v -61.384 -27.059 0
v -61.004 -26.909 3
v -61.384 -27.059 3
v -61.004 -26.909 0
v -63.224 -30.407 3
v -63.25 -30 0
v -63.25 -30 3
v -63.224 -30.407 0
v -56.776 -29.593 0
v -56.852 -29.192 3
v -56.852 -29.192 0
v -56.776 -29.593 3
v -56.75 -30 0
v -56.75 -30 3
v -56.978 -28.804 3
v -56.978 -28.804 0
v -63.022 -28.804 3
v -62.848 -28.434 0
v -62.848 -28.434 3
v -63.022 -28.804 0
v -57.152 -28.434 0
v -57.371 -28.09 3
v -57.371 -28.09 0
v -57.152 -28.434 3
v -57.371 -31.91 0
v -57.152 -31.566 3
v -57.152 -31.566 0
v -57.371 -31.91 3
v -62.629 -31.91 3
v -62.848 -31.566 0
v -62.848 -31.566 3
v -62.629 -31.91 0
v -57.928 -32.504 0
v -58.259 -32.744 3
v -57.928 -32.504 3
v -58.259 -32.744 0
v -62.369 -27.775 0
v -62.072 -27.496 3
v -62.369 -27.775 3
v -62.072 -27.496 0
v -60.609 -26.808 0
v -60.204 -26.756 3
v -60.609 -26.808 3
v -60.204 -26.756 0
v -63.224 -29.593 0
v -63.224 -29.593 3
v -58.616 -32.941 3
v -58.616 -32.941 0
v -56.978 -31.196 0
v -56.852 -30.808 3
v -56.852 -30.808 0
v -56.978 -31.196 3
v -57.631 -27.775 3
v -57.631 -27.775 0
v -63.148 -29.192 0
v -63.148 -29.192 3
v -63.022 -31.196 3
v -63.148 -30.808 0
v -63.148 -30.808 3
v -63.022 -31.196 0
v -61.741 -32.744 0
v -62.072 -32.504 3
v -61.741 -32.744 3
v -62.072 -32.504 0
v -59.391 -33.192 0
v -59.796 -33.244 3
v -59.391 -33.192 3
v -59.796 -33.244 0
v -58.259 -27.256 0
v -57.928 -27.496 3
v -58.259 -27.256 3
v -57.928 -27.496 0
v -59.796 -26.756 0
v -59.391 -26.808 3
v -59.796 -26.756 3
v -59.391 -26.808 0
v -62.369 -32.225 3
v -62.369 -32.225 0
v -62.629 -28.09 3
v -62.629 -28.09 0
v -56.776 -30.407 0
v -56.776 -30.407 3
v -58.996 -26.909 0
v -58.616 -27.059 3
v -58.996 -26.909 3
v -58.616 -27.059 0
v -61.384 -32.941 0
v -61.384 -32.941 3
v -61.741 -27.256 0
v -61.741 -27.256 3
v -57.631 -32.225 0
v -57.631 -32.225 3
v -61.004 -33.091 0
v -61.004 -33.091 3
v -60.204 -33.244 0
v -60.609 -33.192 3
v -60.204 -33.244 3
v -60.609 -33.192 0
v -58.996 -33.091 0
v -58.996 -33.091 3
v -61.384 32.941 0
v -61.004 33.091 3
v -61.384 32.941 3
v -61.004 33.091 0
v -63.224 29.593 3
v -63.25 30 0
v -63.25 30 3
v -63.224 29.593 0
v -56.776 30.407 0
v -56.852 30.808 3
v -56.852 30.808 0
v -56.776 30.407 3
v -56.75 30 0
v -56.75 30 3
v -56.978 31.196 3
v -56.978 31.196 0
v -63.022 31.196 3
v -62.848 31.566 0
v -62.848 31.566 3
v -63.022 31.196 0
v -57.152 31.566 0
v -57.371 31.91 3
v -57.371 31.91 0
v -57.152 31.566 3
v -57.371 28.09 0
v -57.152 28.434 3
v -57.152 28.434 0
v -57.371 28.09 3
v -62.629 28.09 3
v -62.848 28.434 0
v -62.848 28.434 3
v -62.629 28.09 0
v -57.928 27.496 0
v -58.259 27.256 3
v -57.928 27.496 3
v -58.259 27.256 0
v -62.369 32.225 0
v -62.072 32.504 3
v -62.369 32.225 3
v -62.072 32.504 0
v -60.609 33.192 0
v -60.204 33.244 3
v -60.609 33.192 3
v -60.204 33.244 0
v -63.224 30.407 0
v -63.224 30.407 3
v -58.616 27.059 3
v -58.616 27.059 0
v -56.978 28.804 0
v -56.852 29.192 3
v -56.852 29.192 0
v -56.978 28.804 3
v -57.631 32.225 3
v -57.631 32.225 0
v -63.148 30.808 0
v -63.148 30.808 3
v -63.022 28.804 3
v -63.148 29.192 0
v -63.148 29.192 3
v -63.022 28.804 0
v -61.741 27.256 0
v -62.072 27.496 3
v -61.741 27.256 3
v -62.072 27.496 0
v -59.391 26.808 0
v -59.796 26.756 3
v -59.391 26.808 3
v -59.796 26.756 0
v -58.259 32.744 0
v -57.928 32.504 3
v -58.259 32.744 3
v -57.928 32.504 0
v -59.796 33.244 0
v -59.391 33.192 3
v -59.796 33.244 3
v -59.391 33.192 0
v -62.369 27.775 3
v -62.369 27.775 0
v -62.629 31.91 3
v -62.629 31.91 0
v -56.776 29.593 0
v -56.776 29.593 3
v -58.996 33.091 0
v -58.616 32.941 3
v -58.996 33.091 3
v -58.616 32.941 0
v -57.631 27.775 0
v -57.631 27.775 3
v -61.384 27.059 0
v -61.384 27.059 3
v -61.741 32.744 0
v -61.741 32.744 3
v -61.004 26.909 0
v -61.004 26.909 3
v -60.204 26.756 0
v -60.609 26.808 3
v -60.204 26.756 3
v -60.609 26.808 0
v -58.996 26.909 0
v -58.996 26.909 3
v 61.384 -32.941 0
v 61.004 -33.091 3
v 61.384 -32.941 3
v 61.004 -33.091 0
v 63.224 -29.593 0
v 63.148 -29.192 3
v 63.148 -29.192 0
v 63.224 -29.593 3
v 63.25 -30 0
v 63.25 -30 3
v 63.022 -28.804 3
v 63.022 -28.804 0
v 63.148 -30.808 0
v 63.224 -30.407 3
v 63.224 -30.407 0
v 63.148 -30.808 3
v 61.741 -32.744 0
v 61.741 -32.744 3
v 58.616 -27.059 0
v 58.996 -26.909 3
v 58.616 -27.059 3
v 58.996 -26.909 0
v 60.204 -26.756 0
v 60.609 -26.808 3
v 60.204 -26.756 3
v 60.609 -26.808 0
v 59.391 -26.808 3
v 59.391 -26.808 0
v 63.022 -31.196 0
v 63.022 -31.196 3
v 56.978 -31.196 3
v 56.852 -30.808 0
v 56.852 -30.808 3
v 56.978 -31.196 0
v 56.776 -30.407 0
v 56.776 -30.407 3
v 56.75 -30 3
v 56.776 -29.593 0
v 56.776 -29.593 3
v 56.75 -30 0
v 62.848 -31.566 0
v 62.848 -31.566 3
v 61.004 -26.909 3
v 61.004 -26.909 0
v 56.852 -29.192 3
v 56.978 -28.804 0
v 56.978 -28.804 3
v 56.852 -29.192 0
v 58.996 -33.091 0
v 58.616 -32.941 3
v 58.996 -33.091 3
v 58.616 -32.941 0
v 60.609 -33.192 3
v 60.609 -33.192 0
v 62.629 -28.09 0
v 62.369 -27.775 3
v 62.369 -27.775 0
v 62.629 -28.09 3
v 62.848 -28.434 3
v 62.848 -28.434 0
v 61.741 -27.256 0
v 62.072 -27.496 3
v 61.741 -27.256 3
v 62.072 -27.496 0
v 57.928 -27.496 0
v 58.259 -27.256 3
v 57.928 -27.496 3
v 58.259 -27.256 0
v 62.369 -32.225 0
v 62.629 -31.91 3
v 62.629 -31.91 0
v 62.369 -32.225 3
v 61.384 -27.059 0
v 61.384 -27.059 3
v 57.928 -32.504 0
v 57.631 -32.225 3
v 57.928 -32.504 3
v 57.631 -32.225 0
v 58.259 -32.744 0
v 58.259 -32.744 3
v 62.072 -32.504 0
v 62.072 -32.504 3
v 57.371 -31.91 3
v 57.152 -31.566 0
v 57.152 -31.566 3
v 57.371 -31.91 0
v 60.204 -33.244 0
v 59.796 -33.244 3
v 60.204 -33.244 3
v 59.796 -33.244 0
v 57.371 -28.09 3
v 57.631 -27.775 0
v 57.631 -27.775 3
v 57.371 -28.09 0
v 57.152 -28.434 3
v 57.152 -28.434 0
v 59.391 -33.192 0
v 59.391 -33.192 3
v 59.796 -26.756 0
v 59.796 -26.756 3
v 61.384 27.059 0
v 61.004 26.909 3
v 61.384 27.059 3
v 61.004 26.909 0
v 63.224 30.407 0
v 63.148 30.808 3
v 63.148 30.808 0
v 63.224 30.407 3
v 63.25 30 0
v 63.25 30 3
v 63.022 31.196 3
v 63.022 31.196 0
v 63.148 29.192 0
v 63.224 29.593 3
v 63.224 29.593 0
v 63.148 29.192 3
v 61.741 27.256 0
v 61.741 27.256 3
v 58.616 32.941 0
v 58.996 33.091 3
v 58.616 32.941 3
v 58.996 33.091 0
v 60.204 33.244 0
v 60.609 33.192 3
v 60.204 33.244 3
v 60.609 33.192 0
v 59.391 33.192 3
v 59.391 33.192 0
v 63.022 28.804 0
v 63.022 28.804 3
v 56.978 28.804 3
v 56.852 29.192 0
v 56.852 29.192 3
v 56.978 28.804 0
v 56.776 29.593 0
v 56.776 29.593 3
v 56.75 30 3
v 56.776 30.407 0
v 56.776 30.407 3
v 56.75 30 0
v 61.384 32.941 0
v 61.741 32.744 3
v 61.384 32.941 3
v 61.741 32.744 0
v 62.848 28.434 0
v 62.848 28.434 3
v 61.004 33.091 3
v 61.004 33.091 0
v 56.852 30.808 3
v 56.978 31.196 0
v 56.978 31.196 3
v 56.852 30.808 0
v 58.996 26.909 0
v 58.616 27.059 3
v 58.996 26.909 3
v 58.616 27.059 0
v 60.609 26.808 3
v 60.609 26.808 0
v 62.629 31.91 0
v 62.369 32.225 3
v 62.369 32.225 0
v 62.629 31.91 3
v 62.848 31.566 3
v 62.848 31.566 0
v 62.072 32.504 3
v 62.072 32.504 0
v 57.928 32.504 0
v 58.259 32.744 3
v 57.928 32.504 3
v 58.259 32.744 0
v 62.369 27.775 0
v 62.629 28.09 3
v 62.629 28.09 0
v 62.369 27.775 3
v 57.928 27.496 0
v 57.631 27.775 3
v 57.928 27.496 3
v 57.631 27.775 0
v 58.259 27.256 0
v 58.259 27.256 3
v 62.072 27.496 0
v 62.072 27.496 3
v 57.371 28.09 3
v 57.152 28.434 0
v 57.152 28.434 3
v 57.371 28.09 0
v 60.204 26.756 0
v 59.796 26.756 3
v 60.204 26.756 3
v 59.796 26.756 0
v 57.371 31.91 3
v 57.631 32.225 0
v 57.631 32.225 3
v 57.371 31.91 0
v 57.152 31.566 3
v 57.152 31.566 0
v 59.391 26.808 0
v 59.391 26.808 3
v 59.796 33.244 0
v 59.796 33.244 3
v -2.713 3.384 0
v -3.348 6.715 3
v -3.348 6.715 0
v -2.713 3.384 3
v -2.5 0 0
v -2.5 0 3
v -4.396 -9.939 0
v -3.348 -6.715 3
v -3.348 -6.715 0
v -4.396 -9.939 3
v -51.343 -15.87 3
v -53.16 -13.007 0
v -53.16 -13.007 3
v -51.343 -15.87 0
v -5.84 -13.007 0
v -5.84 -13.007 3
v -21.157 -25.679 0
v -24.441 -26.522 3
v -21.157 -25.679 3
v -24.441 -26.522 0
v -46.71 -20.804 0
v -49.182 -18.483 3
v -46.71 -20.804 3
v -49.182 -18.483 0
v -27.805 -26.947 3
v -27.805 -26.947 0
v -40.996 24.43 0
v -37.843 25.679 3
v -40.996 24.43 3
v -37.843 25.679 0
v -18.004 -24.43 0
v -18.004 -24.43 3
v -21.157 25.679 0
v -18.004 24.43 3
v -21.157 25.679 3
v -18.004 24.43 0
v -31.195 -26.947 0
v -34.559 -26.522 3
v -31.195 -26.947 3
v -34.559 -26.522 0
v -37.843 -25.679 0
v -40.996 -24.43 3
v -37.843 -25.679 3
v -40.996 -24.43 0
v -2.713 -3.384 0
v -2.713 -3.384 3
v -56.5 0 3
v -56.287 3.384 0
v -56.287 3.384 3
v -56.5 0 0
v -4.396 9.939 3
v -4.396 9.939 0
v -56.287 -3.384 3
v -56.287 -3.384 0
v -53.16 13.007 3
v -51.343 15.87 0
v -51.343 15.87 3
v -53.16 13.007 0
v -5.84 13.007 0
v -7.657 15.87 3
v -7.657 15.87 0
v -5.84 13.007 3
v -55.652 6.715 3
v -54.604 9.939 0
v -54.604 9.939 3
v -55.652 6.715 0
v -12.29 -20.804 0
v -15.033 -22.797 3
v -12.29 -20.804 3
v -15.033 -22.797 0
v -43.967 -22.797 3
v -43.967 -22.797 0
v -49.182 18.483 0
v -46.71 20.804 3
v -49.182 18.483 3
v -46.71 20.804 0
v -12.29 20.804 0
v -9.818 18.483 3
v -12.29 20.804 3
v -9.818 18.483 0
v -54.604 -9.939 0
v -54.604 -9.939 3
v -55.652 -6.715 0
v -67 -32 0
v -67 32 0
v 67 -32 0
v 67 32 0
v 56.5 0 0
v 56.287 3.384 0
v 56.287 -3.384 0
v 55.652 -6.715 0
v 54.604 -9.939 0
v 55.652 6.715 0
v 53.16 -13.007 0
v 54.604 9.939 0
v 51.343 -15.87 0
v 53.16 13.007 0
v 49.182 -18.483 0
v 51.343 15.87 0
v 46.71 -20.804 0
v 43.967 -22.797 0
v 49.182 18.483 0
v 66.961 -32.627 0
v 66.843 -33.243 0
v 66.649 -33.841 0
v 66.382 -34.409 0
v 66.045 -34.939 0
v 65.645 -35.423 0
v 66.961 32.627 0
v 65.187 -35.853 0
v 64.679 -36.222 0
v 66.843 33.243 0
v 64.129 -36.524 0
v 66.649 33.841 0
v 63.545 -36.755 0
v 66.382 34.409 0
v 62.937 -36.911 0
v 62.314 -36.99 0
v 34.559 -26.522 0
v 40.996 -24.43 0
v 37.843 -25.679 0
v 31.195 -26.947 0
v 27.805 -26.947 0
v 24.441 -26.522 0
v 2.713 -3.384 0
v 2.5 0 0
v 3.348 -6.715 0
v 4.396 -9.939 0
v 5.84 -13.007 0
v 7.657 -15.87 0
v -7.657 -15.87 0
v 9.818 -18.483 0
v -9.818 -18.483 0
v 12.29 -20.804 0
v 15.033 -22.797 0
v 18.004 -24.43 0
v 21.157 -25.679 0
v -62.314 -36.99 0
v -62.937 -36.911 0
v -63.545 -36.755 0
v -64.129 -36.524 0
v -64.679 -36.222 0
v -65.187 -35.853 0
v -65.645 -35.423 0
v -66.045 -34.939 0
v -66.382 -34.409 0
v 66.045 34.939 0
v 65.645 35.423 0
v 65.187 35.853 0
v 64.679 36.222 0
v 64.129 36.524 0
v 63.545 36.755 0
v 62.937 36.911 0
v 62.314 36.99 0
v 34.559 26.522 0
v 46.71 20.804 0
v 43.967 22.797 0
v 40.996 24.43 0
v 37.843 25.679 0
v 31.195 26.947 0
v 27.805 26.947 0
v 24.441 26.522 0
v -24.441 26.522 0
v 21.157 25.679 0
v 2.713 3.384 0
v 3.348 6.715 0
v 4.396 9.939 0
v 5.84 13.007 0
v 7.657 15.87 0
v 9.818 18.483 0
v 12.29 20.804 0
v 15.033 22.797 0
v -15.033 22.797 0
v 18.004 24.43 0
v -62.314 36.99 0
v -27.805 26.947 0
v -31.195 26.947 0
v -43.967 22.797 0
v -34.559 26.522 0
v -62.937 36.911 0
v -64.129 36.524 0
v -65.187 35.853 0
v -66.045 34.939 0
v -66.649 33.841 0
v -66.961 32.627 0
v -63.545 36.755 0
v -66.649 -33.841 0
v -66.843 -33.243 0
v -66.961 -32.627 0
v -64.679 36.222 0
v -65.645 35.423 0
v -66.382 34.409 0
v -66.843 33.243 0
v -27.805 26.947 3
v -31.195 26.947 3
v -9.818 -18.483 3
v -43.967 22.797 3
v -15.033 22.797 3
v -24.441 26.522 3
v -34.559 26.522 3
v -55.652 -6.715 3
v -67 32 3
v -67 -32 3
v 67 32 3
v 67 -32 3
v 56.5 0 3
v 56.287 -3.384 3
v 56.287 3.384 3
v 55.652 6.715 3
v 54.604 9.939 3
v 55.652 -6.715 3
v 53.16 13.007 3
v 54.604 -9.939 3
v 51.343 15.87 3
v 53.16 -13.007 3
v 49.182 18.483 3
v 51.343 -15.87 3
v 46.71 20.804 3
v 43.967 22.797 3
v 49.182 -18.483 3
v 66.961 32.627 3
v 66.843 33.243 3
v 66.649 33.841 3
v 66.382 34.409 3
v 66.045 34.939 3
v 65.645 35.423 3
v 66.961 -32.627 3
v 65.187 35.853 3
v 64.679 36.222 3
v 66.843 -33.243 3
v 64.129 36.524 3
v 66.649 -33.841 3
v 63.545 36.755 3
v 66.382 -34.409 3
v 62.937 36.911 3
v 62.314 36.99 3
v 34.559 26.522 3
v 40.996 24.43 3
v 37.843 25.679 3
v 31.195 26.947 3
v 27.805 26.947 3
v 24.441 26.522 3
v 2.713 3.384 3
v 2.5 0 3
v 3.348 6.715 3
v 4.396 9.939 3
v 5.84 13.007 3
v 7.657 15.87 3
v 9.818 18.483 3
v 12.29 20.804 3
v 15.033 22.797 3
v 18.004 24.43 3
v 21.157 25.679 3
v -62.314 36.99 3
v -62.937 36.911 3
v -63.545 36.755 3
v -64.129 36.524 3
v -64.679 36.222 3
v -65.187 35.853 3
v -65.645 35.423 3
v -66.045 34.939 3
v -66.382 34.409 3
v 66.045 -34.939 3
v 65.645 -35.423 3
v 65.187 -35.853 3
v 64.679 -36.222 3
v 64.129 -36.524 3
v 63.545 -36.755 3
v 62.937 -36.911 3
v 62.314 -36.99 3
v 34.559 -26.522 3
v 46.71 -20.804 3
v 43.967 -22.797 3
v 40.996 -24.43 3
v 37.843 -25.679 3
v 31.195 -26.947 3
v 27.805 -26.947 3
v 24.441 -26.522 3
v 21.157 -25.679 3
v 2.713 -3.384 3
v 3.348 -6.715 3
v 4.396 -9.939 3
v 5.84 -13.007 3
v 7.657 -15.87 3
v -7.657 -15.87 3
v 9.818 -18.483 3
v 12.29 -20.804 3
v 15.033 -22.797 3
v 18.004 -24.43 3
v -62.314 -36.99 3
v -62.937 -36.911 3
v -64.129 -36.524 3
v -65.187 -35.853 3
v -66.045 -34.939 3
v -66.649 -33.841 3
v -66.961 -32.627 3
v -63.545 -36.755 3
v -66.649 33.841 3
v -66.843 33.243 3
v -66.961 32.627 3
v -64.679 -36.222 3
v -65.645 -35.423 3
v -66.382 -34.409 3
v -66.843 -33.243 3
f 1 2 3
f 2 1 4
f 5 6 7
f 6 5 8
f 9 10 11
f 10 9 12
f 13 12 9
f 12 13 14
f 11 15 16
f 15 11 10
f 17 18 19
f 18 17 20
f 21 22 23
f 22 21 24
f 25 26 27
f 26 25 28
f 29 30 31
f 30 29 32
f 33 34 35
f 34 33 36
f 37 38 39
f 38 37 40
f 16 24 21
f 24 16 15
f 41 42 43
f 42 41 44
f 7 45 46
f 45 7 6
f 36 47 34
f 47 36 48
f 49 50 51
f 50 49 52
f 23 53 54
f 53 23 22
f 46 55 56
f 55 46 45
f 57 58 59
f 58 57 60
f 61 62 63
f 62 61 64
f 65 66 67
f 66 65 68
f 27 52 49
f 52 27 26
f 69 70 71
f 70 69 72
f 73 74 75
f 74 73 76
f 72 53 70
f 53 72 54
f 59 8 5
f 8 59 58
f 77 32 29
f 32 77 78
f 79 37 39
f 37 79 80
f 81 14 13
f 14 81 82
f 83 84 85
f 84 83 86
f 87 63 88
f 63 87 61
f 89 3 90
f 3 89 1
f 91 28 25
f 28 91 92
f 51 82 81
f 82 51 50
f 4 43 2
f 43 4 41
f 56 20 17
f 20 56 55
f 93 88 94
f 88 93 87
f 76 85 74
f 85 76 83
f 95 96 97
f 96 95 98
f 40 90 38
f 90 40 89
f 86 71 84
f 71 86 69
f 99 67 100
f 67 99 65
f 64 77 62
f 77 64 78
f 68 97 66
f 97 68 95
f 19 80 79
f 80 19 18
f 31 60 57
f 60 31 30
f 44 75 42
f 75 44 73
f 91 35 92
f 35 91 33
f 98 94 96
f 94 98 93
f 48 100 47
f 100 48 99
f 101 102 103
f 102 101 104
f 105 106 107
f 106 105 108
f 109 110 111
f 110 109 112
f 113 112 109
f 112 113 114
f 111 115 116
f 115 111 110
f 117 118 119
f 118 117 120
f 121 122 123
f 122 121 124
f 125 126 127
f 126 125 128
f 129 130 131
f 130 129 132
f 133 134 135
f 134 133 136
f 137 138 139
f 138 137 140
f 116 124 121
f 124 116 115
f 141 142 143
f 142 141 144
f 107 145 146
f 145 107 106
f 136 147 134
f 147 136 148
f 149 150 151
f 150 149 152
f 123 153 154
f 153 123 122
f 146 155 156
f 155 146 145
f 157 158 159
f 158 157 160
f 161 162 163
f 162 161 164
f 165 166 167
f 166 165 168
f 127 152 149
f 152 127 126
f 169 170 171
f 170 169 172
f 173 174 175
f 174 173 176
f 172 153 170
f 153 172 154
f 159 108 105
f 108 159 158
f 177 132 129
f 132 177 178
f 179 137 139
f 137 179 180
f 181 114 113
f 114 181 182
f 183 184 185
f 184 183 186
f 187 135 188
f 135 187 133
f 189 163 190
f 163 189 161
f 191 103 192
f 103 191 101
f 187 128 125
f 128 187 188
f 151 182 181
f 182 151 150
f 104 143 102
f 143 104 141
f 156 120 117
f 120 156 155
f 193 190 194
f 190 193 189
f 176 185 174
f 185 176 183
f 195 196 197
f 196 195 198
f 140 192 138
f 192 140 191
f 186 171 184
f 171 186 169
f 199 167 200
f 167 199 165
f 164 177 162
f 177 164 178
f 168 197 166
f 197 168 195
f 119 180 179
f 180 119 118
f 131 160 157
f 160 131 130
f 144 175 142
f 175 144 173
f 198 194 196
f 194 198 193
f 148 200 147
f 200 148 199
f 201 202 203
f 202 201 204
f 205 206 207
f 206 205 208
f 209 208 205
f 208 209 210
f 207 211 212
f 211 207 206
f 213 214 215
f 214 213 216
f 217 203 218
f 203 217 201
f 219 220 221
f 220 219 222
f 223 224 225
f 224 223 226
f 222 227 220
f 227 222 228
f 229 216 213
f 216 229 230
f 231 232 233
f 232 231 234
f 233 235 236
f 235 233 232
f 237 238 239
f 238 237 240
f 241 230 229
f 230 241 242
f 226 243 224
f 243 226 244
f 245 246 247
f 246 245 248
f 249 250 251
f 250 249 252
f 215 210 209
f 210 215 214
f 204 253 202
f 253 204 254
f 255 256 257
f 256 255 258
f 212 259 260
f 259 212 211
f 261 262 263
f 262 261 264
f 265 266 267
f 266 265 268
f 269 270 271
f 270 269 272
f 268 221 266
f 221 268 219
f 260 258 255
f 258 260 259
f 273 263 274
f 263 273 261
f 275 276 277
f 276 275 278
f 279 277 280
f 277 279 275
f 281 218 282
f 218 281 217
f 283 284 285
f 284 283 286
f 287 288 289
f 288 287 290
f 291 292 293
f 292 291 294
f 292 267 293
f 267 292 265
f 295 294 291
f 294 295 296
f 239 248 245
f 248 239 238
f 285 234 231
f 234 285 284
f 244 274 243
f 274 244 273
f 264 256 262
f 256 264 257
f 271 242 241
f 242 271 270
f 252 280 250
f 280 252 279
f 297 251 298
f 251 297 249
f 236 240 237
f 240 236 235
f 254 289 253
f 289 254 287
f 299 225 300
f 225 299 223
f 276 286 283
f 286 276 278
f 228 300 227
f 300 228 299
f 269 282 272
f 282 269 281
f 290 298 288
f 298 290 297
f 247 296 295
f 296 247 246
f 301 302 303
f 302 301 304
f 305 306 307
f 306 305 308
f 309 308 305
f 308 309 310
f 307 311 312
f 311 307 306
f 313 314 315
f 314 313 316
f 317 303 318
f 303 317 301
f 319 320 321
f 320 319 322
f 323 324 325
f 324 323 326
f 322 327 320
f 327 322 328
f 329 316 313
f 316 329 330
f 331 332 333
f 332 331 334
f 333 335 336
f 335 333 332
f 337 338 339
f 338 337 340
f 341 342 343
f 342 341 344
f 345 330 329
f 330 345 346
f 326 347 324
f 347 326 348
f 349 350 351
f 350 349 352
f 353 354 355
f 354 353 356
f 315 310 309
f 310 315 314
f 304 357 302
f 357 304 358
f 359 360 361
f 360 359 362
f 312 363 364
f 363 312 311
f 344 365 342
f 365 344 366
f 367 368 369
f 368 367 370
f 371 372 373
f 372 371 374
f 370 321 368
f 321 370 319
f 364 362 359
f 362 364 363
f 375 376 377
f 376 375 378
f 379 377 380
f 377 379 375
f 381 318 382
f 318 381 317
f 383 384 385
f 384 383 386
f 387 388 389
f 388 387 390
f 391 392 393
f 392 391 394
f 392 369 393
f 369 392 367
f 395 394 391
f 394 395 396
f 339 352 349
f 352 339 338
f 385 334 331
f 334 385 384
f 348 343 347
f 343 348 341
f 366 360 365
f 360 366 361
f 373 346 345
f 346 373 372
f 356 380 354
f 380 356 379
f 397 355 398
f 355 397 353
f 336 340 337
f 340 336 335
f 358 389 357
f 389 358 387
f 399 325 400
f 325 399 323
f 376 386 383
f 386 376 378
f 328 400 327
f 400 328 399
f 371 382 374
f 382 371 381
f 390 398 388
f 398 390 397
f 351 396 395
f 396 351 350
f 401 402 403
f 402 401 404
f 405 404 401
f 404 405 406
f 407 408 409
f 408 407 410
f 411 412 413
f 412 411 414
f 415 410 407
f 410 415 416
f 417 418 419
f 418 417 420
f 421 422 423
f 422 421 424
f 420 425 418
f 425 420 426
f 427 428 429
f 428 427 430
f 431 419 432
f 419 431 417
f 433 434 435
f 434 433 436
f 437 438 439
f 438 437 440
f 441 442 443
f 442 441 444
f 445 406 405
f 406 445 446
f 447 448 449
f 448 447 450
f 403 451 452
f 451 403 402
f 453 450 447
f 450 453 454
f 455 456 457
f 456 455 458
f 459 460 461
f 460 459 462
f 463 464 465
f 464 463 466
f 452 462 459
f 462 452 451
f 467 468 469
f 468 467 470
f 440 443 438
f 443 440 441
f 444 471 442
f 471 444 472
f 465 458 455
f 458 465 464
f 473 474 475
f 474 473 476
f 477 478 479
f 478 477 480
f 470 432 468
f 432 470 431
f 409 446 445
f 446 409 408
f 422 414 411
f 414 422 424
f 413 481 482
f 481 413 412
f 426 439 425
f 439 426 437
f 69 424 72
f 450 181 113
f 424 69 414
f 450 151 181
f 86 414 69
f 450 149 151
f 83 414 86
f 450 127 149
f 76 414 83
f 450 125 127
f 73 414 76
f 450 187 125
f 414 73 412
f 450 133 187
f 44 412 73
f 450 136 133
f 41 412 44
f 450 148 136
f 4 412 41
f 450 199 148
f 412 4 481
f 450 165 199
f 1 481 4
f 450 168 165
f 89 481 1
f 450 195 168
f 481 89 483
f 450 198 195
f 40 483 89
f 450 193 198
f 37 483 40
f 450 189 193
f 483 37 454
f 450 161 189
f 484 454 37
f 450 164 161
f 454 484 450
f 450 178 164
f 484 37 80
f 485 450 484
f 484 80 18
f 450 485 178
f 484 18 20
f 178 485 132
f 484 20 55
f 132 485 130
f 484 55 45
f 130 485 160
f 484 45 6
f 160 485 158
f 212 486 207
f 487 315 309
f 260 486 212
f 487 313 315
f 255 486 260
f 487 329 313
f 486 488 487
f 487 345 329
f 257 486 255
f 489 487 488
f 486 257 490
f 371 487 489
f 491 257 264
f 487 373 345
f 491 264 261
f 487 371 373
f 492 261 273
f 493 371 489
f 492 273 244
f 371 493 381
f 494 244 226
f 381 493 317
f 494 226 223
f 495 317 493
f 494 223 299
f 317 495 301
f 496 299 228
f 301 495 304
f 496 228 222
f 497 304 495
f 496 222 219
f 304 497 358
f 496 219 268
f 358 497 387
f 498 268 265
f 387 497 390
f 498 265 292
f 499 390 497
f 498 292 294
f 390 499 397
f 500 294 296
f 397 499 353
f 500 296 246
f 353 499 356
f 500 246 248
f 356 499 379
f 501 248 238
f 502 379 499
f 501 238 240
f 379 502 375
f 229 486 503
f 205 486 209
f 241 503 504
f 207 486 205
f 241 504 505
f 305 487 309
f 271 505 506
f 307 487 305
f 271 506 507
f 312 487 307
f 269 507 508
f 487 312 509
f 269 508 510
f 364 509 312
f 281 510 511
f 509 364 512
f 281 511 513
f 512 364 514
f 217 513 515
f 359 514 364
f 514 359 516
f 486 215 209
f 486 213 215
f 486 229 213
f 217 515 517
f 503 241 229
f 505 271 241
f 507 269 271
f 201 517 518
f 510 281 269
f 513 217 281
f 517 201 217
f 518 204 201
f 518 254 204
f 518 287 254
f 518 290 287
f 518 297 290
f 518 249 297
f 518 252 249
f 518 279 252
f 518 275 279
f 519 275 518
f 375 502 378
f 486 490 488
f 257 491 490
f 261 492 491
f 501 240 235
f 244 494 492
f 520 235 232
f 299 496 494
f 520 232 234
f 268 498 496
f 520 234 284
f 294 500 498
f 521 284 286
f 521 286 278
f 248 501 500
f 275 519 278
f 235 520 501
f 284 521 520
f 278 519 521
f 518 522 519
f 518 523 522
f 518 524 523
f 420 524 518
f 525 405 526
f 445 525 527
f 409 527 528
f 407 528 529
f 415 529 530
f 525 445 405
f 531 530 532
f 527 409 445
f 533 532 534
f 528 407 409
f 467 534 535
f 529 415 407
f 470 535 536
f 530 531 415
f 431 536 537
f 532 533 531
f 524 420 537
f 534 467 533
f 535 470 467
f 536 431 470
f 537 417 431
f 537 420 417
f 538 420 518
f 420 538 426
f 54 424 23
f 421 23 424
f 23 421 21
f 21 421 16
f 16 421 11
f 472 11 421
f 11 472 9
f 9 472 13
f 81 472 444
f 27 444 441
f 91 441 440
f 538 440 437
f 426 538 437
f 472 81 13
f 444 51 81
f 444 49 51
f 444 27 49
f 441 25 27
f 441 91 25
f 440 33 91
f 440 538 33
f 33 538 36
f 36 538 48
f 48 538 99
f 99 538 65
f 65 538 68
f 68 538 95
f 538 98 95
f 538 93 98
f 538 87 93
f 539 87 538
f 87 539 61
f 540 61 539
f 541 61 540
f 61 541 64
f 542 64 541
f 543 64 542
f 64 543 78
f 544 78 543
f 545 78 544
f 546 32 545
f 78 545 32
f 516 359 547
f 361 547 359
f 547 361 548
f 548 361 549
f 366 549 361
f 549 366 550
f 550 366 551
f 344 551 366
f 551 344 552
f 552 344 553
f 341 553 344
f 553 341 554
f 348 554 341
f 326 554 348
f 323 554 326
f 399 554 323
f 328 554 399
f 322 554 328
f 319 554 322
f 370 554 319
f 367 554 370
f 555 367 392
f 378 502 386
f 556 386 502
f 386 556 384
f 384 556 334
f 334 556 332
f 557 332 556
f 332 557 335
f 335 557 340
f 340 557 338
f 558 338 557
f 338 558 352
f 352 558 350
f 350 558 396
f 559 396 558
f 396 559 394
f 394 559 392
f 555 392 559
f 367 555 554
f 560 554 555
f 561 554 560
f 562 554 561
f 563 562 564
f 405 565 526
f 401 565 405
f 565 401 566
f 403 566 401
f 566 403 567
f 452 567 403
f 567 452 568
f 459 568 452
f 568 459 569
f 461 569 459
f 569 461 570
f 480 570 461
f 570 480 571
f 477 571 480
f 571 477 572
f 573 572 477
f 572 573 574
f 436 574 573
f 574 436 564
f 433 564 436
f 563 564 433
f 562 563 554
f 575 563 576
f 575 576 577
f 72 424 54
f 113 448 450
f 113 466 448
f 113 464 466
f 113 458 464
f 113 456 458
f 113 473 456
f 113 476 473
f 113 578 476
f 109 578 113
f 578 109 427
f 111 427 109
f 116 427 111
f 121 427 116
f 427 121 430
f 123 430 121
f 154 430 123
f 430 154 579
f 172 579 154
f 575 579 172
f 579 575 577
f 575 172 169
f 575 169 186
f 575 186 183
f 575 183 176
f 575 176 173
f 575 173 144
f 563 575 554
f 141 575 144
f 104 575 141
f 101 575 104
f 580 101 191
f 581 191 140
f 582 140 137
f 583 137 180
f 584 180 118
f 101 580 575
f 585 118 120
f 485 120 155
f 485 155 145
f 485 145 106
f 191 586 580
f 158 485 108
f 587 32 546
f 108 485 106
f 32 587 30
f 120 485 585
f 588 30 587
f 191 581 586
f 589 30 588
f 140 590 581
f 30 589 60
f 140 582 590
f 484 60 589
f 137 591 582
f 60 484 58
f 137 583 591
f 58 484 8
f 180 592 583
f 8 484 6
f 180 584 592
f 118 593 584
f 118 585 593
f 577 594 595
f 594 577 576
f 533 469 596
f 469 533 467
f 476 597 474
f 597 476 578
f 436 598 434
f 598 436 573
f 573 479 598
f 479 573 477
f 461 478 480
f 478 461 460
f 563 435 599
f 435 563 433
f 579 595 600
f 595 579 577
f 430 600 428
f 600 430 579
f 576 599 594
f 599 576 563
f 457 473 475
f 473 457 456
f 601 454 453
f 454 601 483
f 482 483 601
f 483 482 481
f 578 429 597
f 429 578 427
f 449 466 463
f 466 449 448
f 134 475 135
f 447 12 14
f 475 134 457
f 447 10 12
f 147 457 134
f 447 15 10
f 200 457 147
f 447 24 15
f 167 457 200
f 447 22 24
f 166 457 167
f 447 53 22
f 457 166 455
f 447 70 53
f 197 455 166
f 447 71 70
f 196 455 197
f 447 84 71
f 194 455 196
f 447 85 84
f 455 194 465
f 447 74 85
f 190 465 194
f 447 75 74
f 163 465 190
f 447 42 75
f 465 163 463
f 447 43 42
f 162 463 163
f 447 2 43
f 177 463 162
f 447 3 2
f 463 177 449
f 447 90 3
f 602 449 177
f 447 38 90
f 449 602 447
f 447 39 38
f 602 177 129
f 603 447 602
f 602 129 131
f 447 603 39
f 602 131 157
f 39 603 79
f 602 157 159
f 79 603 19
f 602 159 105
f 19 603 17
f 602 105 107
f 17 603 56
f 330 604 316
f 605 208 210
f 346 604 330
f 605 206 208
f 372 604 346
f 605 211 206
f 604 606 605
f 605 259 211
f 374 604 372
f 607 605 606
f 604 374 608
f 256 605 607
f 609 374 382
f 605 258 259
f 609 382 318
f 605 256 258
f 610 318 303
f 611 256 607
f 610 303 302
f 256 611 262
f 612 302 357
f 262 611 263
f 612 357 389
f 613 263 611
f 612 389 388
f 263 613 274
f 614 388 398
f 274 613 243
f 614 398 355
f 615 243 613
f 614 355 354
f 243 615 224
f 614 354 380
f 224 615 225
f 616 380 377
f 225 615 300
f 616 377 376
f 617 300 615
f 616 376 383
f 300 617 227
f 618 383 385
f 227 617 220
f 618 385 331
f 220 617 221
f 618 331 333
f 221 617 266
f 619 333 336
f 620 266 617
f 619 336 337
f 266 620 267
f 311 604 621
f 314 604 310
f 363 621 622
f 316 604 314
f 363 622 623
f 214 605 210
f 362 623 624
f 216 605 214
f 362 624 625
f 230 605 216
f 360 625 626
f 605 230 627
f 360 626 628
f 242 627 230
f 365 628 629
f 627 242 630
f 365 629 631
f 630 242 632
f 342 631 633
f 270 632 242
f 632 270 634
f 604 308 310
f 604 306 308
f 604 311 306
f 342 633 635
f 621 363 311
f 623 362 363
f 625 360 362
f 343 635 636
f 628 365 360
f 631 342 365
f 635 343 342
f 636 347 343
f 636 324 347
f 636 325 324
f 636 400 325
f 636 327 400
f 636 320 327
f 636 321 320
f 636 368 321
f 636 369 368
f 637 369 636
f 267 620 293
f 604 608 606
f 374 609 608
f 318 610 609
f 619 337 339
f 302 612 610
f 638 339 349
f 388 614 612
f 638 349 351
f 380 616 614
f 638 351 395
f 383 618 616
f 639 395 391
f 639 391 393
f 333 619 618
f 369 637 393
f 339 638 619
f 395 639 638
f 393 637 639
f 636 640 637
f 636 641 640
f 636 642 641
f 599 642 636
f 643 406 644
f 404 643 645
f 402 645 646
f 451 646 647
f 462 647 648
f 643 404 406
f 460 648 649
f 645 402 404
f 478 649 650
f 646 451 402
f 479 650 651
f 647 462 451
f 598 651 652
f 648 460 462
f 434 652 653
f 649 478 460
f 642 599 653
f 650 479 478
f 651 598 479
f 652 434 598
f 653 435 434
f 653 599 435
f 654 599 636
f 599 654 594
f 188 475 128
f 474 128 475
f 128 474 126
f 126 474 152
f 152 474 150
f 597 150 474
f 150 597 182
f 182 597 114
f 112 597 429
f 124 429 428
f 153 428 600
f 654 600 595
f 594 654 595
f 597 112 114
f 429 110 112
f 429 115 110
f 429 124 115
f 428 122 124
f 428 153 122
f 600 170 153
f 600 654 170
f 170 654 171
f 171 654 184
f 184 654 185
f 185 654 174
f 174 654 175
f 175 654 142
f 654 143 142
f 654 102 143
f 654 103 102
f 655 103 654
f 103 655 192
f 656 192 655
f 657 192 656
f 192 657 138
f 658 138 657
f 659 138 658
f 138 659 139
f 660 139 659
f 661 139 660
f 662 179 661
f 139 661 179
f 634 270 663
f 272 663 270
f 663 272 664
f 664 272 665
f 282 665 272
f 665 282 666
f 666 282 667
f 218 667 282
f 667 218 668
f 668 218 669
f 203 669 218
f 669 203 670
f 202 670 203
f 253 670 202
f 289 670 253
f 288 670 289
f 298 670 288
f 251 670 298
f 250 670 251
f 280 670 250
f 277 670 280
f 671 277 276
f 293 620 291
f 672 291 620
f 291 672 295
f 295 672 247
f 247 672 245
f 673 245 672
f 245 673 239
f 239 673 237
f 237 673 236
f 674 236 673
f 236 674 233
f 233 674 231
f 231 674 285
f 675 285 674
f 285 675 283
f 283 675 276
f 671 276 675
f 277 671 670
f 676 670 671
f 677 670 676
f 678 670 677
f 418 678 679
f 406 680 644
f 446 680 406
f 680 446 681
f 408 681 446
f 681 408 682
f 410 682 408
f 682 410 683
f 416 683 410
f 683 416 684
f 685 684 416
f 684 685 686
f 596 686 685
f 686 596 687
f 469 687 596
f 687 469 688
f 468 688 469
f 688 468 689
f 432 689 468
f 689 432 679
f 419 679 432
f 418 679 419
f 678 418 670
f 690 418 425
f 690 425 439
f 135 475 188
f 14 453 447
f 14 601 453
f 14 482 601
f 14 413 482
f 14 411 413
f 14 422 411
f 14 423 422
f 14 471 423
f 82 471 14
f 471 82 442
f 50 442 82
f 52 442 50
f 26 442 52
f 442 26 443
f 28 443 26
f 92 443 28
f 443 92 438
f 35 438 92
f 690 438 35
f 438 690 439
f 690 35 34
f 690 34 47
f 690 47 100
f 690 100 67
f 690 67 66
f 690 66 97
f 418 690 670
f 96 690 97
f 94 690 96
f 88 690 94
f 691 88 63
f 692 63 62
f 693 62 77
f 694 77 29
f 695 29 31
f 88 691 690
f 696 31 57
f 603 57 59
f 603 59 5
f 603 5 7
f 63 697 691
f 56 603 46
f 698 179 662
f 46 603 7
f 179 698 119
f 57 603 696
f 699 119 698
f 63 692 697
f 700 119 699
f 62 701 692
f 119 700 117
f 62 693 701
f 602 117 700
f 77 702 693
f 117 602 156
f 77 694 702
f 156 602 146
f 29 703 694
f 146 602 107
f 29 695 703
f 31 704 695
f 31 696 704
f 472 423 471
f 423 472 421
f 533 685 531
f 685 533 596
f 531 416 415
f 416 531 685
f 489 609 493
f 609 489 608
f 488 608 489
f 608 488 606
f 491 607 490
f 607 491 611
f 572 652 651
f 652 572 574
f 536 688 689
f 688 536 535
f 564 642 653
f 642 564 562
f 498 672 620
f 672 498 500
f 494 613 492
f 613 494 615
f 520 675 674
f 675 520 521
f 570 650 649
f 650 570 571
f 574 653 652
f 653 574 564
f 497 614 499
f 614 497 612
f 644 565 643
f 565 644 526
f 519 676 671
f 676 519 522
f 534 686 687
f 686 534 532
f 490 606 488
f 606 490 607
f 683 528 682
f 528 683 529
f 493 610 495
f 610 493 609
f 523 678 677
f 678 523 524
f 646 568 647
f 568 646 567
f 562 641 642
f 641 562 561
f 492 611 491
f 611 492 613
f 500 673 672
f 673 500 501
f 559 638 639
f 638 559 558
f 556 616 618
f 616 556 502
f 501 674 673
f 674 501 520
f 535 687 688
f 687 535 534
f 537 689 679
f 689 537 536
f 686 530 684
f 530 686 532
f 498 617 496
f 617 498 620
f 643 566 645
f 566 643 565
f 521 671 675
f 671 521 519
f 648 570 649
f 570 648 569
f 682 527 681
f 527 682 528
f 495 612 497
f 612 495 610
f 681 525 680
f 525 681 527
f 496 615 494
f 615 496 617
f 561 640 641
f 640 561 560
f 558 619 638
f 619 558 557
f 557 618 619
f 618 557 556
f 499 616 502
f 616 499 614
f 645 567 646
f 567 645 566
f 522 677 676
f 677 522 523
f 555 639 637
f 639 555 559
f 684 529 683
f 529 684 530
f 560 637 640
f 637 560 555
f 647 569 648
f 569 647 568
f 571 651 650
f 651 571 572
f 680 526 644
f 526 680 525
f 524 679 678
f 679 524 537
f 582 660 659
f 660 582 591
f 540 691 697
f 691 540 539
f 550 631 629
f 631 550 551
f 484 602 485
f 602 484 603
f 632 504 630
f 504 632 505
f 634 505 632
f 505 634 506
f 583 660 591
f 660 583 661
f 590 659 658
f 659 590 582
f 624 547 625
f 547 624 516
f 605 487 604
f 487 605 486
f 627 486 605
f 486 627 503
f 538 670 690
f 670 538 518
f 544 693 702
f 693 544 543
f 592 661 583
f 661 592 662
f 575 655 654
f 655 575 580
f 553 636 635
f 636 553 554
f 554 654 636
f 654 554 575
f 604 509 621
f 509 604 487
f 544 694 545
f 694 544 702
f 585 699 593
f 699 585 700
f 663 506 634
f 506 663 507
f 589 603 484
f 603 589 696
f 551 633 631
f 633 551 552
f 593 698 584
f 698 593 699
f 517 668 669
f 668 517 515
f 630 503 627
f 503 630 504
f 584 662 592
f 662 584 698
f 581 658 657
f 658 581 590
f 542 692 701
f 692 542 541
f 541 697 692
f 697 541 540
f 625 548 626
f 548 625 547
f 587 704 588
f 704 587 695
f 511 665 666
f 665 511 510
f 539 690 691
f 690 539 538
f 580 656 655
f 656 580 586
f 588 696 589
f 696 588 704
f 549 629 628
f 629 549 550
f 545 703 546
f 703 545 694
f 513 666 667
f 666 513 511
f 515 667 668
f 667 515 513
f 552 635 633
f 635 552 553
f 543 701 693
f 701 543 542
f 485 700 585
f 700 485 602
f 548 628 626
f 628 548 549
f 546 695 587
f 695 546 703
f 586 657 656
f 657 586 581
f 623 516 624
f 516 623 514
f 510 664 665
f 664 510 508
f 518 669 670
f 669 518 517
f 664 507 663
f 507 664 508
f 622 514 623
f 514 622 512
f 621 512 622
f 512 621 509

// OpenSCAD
$fn = 50;


difference() {
	union() {
		hull() {
			translate(v = [-62.0000000000, 32.0000000000, 0]) {
				cylinder(h = 3, r = 5);
			}
			translate(v = [62.0000000000, 32.0000000000, 0]) {
				cylinder(h = 3, r = 5);
			}
			translate(v = [-62.0000000000, -32.0000000000, 0]) {
				cylinder(h = 3, r = 5);
			}
			translate(v = [62.0000000000, -32.0000000000, 0]) {
				cylinder(h = 3, r = 5);
			}
		}
	}
	union() {
		#translate(v = [-60.0000000000, -30.0000000000, -100.0000000000]) {
			cylinder(h = 200, r = 3.2500000000);
		}
		#translate(v = [-60.0000000000, 30.0000000000, -100.0000000000]) {
			cylinder(h = 200, r = 3.2500000000);
		}
		#translate(v = [60.0000000000, -30.0000000000, -100.0000000000]) {
			cylinder(h = 200, r = 3.2500000000);
		}
		#translate(v = [60.0000000000, 30.0000000000, -100.0000000000]) {
			cylinder(h = 200, r = 3.2500000000);
		}
		#translate(v = [-29.5000000000, 0, 0]) {
			cylinder(h = 3, r = 27.0000000000);
		}
		#translate(v = [29.5000000000, 0, 0]) {
			cylinder(h = 3, r = 27.0000000000);
		}
	}
}
